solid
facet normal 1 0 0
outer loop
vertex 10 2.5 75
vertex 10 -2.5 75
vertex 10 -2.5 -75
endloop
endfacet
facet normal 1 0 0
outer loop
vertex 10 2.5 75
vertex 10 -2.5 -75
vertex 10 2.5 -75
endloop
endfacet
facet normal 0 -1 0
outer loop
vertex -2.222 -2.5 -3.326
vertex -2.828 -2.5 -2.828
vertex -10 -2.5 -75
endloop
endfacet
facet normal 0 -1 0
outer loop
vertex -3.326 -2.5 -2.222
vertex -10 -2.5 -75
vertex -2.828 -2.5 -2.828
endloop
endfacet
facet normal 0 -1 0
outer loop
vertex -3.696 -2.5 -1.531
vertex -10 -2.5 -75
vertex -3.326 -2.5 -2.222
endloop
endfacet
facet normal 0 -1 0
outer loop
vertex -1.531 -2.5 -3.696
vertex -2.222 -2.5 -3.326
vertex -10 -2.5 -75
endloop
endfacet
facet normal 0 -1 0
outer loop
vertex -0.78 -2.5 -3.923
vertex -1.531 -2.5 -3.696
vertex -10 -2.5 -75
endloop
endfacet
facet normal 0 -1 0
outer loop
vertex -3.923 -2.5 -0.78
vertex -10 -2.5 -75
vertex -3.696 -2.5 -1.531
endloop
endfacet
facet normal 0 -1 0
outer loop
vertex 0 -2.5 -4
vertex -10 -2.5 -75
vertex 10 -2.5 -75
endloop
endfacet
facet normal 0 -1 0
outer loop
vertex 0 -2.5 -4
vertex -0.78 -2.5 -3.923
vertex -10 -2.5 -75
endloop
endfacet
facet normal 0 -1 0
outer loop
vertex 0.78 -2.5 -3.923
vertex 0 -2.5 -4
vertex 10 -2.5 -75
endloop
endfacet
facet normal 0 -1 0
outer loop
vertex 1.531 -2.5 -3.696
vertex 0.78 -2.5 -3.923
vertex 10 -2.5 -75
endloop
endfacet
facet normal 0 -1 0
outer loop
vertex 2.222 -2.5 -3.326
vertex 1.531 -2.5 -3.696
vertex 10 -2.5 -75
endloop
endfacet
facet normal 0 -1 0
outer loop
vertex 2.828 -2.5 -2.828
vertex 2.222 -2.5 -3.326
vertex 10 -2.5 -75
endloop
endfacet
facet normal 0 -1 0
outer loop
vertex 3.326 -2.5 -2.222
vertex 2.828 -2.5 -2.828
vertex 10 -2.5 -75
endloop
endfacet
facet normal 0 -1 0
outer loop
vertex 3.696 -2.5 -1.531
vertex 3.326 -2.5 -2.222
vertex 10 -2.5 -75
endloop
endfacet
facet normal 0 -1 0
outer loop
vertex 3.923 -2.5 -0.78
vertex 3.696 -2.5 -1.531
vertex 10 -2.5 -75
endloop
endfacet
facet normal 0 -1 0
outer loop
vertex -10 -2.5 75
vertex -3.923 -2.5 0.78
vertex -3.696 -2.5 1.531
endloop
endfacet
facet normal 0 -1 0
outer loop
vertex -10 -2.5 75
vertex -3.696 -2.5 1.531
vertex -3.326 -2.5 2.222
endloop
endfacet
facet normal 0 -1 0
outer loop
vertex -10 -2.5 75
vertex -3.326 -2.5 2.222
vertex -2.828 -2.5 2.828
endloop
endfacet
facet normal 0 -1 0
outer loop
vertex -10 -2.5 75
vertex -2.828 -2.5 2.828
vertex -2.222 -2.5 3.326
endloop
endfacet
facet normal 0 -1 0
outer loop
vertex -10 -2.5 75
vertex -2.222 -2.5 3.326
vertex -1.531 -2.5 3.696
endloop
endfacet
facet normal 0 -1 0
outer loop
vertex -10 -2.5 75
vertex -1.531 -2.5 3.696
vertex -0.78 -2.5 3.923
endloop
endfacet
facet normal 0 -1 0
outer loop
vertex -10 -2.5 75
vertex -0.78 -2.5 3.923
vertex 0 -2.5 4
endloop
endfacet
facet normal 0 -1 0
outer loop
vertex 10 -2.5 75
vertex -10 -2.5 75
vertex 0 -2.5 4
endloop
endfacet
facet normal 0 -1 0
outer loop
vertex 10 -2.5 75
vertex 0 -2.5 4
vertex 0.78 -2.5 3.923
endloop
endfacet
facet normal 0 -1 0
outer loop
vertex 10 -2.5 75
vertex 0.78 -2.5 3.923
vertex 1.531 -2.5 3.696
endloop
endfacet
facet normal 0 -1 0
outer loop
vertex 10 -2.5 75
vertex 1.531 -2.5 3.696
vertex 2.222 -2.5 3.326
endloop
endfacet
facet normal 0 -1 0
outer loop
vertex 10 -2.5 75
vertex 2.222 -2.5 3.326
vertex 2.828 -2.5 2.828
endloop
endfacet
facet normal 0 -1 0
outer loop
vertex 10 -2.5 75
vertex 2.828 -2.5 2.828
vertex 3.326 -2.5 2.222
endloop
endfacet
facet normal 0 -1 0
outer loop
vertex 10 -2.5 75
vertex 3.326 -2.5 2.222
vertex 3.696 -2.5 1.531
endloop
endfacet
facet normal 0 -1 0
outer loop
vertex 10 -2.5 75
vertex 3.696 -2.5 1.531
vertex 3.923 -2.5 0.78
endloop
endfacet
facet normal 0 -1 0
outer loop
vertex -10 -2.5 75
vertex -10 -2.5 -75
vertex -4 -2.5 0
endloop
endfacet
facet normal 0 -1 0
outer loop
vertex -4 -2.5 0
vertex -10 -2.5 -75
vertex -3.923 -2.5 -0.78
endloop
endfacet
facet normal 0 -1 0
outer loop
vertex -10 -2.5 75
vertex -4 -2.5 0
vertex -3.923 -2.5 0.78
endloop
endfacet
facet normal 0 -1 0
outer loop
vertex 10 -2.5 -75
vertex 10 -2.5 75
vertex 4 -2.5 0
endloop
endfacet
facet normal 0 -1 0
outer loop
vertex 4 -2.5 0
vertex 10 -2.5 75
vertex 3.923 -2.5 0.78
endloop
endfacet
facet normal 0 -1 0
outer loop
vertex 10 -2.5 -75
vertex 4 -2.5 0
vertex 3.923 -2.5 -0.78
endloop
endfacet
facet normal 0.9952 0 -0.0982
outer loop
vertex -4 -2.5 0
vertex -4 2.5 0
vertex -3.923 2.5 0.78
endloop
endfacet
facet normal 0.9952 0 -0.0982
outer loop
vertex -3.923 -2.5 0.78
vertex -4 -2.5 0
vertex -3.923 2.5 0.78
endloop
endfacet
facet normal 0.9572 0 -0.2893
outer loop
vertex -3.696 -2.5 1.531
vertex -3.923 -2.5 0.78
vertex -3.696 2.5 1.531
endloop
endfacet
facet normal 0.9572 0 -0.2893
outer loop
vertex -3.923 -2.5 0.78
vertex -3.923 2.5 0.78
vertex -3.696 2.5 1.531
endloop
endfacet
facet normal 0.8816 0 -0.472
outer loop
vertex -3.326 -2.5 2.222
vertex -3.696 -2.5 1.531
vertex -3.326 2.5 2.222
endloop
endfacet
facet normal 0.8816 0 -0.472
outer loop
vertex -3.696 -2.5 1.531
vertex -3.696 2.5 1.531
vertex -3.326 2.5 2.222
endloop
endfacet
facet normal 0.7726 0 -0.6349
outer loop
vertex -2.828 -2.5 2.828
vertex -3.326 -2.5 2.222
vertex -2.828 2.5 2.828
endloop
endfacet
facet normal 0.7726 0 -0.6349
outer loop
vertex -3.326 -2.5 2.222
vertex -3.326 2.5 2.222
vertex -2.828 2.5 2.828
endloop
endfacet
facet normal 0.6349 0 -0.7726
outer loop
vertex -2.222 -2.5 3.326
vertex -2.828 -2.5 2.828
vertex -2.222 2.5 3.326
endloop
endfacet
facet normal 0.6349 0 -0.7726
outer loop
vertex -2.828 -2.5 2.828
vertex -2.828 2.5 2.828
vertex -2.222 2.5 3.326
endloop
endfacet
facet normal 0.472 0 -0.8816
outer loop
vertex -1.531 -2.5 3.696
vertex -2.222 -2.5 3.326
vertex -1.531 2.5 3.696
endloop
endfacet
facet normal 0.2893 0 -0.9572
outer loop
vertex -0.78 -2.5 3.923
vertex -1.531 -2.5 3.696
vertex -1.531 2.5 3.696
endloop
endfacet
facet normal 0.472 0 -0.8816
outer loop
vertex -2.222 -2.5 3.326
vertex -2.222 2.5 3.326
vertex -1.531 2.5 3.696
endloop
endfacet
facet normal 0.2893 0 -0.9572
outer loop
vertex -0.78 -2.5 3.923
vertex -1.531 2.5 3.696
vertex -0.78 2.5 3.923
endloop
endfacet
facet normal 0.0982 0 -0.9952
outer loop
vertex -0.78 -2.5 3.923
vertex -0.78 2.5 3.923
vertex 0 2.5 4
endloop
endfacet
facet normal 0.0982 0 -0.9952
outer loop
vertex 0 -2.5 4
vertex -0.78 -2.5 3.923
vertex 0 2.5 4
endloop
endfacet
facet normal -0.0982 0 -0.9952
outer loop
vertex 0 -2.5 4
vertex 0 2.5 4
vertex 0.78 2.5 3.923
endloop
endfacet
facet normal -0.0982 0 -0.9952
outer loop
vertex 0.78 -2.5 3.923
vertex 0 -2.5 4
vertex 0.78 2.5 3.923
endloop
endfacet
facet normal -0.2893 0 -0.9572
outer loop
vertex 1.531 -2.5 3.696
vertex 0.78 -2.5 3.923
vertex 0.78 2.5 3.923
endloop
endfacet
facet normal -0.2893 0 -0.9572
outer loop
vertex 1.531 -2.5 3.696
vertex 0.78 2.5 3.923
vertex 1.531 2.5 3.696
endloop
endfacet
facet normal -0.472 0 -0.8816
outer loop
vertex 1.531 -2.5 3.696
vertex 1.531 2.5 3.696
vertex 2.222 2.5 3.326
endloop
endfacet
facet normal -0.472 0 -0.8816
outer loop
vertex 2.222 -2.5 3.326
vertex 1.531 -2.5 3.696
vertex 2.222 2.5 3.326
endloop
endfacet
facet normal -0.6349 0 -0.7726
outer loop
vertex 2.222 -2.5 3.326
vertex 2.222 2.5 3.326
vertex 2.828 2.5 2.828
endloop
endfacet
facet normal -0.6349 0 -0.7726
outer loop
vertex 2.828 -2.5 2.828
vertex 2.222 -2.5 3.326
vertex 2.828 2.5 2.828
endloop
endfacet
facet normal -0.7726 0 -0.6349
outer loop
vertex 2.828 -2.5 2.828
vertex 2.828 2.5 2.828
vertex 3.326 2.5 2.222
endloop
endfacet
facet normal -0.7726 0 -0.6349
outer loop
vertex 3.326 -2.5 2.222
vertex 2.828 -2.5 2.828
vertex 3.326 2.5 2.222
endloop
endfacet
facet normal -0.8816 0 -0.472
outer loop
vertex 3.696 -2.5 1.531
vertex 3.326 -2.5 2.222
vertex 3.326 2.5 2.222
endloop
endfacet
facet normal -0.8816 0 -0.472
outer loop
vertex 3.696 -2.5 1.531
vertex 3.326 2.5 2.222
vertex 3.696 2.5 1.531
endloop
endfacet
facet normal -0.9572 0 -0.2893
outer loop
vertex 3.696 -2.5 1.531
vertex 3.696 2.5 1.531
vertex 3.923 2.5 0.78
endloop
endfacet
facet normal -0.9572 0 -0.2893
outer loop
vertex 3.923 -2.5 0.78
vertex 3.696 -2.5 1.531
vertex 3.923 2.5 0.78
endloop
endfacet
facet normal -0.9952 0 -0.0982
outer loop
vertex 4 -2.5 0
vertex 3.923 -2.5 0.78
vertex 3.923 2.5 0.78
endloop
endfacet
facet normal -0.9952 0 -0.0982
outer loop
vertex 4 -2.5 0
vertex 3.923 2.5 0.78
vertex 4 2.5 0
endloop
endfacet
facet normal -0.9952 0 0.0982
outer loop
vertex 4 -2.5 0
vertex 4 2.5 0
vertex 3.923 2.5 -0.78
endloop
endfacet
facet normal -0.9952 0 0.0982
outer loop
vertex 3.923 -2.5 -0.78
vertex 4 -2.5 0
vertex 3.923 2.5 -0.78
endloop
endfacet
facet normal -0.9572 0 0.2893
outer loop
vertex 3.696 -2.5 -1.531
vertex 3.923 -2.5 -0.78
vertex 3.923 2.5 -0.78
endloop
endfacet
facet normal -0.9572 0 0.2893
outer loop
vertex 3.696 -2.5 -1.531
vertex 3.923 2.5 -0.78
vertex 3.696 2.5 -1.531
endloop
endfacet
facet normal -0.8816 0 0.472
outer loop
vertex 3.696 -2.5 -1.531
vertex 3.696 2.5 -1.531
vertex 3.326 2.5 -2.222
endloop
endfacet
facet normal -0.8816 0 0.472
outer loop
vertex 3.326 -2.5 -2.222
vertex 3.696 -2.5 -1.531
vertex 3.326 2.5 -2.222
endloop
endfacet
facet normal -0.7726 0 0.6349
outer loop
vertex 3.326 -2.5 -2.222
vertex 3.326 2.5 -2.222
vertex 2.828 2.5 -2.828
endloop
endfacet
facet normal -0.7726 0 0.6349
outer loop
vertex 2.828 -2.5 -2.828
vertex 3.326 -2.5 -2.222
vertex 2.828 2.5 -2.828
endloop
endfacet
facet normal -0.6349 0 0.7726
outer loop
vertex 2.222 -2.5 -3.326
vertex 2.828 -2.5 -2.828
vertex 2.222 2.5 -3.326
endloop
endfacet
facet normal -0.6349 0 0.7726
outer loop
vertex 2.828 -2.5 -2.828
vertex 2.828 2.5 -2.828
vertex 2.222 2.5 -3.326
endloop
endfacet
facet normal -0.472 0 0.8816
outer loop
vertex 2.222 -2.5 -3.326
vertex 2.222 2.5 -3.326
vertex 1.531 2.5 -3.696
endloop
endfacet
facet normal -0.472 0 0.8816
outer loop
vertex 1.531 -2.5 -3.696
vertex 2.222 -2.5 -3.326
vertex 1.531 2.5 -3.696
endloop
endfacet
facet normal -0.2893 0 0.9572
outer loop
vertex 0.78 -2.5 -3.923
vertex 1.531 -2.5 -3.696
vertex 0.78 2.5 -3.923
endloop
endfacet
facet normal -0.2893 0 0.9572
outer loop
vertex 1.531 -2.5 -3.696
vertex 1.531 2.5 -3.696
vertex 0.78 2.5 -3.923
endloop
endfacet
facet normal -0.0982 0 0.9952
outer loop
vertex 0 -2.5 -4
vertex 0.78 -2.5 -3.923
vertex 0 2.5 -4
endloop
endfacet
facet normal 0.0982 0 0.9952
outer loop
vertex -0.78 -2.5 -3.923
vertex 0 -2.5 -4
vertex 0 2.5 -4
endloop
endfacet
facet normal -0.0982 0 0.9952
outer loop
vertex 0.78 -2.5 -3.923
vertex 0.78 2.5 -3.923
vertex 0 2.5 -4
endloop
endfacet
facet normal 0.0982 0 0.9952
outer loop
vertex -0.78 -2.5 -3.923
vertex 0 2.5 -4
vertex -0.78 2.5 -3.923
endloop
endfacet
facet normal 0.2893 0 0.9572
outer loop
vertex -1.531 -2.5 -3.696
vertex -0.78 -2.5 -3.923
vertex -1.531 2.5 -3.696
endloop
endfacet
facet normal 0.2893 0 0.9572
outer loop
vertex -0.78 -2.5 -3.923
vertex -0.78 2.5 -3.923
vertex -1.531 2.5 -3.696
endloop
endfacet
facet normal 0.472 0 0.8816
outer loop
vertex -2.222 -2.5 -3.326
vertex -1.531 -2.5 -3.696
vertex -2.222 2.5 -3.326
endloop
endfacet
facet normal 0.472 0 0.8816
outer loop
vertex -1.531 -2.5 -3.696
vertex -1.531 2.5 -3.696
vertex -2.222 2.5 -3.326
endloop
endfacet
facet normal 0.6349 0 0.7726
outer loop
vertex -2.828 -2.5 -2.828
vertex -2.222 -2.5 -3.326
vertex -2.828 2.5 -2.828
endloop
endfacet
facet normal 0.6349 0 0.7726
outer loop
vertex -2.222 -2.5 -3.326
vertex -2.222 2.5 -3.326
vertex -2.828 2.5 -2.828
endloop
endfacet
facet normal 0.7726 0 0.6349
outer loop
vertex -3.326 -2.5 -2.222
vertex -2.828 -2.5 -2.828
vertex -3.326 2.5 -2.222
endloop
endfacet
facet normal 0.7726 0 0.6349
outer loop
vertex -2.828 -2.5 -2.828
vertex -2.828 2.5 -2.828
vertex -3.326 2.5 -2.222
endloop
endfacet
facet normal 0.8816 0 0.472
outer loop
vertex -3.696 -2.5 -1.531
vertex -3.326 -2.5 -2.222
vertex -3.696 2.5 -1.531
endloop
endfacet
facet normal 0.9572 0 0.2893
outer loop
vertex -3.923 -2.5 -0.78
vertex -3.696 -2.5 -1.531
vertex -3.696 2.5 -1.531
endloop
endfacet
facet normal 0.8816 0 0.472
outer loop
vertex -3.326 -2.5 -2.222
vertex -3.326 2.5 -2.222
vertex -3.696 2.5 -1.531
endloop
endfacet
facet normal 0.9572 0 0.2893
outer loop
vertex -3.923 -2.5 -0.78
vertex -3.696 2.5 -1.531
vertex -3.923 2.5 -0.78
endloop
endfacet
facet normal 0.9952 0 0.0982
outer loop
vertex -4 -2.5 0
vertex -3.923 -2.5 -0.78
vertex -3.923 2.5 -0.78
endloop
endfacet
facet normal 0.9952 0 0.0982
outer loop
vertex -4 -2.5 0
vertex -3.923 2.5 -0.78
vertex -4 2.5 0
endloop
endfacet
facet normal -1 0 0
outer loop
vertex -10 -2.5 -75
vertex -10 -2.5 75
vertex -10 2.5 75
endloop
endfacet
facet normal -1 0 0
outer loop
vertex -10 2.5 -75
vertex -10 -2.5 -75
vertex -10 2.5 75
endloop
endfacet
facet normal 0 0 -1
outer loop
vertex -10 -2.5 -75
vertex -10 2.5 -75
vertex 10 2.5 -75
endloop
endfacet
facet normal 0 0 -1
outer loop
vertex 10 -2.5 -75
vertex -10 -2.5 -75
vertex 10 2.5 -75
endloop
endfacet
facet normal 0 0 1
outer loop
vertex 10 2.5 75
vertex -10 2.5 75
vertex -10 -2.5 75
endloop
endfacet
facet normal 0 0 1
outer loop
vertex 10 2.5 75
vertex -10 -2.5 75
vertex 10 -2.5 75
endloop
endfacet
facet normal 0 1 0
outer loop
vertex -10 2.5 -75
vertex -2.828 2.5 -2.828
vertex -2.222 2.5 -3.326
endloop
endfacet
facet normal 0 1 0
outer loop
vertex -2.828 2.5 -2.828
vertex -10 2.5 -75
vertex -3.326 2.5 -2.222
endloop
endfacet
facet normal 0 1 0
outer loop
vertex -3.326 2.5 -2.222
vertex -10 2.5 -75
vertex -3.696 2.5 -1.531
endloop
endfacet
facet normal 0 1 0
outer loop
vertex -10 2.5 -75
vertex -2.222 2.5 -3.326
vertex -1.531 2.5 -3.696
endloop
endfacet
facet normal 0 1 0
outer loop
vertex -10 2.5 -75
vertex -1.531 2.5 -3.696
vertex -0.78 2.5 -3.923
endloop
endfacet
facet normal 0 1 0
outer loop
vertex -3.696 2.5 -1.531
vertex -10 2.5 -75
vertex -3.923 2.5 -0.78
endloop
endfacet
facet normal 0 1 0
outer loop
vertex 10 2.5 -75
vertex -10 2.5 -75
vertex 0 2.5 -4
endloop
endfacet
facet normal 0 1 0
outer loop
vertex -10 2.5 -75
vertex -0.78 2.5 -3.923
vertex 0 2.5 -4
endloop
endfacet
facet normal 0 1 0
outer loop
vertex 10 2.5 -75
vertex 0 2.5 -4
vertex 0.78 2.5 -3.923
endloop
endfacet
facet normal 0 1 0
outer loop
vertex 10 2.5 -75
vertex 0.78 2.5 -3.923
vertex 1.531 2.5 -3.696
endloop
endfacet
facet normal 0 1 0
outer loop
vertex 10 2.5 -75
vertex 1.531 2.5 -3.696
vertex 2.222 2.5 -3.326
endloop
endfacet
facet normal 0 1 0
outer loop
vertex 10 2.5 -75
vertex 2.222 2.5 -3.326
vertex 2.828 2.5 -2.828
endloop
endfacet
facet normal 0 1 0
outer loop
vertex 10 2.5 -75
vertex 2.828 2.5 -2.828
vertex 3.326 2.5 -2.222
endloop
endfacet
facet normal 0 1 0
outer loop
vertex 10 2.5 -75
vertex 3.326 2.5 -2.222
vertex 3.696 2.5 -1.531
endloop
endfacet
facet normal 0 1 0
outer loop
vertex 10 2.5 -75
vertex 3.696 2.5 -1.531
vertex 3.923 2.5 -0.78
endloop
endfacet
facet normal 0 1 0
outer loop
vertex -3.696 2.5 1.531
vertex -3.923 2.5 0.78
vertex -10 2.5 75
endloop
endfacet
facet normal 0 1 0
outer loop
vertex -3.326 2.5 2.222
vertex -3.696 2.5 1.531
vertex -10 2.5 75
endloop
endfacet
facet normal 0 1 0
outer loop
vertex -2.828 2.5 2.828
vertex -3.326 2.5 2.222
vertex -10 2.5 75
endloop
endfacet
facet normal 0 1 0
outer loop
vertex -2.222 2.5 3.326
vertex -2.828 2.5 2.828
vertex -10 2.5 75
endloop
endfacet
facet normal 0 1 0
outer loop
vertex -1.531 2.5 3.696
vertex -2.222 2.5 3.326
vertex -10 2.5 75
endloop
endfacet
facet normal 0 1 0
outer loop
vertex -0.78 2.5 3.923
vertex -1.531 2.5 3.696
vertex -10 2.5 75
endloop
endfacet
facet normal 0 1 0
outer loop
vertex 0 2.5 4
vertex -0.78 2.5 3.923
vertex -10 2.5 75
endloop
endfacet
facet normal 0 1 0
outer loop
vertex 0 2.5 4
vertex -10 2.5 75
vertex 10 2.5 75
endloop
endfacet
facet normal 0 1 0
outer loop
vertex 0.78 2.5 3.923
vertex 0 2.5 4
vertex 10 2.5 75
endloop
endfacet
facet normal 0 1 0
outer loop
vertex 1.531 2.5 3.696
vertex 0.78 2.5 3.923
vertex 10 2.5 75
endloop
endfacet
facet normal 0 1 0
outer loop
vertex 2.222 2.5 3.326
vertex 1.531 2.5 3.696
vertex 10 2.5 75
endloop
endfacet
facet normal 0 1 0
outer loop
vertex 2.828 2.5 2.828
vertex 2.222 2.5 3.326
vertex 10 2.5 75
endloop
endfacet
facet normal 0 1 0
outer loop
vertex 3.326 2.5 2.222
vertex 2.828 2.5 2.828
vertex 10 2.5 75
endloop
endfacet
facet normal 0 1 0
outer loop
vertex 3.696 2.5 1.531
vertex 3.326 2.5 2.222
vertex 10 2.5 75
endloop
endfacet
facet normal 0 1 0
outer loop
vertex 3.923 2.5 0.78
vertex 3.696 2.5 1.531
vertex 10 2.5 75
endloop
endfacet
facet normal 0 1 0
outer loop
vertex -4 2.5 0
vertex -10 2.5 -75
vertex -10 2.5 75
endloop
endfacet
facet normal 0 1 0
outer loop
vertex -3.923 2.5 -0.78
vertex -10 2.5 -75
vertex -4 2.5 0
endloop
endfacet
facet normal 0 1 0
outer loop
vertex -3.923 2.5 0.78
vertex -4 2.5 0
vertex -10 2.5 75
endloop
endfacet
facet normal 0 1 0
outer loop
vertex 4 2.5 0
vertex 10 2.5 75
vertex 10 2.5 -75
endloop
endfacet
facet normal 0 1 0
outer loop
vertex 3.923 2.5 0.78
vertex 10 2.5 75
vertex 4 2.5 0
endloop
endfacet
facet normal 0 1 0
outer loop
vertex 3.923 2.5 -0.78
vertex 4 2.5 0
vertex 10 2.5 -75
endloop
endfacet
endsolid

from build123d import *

# Parameters (mm, degrees)
SKETCH1_W                       = 20
SKETCH1_H                       = 5
BOSS_EXTRUDE1_DEPTH             = 106
SKETCH2_R                       = 4
HOLES_FOR_20MM_STRIP_ONLY_DEPTH = 107.587991819
SKETCH5_OUTSIDE_W               = 64.6
SKETCH5_OUTSIDE_H               = 256.6
SKETCH5_OUTSIDE_W_2             = 51.505008444
SKETCH5_OUTSIDE_H_2             = 150
CUT_EXTRUDE3_DEPTH              = 107.587991819


with BuildPart() as part:
    # Sketch1 → Boss-Extrude1 (new, symmetric)
    with BuildSketch(Plane.XY):
        Rectangle(SKETCH1_W, SKETCH1_H)
    extrude(amount=BOSS_EXTRUDE1_DEPTH, both=True)

    # Sketch2 → Holes for 20mm strip ONLY (cut, through all)
    with BuildSketch(Plane(origin=(0, 2.5, 0), x_dir=(1, 0, 0), z_dir=(0, 1, 0))):
        with Locations(Location((0, 87.5, 0), (0, 0, 180))):
            Circle(SKETCH2_R)
        with Locations(Location((0, 0, 0), (0, 0, 180))):
            Circle(SKETCH2_R)
        with Locations(Location((0, -87.5, 0), (0, 0, 180))):
            Circle(SKETCH2_R)
    extrude(amount=-HOLES_FOR_20MM_STRIP_ONLY_DEPTH, mode=Mode.SUBTRACT)

    # Sketch5 outside → Cut-Extrude3 (cut, through all)
    with BuildSketch(Plane(origin=(0, 2.5, 0), x_dir=(1, 0, 0), z_dir=(0, 1, 0))):
        Rectangle(SKETCH5_OUTSIDE_W, SKETCH5_OUTSIDE_H)
        Rectangle(SKETCH5_OUTSIDE_W_2, SKETCH5_OUTSIDE_H_2, mode=Mode.SUBTRACT)
    extrude(amount=-CUT_EXTRUDE3_DEPTH, mode=Mode.SUBTRACT)


solid = part.part
